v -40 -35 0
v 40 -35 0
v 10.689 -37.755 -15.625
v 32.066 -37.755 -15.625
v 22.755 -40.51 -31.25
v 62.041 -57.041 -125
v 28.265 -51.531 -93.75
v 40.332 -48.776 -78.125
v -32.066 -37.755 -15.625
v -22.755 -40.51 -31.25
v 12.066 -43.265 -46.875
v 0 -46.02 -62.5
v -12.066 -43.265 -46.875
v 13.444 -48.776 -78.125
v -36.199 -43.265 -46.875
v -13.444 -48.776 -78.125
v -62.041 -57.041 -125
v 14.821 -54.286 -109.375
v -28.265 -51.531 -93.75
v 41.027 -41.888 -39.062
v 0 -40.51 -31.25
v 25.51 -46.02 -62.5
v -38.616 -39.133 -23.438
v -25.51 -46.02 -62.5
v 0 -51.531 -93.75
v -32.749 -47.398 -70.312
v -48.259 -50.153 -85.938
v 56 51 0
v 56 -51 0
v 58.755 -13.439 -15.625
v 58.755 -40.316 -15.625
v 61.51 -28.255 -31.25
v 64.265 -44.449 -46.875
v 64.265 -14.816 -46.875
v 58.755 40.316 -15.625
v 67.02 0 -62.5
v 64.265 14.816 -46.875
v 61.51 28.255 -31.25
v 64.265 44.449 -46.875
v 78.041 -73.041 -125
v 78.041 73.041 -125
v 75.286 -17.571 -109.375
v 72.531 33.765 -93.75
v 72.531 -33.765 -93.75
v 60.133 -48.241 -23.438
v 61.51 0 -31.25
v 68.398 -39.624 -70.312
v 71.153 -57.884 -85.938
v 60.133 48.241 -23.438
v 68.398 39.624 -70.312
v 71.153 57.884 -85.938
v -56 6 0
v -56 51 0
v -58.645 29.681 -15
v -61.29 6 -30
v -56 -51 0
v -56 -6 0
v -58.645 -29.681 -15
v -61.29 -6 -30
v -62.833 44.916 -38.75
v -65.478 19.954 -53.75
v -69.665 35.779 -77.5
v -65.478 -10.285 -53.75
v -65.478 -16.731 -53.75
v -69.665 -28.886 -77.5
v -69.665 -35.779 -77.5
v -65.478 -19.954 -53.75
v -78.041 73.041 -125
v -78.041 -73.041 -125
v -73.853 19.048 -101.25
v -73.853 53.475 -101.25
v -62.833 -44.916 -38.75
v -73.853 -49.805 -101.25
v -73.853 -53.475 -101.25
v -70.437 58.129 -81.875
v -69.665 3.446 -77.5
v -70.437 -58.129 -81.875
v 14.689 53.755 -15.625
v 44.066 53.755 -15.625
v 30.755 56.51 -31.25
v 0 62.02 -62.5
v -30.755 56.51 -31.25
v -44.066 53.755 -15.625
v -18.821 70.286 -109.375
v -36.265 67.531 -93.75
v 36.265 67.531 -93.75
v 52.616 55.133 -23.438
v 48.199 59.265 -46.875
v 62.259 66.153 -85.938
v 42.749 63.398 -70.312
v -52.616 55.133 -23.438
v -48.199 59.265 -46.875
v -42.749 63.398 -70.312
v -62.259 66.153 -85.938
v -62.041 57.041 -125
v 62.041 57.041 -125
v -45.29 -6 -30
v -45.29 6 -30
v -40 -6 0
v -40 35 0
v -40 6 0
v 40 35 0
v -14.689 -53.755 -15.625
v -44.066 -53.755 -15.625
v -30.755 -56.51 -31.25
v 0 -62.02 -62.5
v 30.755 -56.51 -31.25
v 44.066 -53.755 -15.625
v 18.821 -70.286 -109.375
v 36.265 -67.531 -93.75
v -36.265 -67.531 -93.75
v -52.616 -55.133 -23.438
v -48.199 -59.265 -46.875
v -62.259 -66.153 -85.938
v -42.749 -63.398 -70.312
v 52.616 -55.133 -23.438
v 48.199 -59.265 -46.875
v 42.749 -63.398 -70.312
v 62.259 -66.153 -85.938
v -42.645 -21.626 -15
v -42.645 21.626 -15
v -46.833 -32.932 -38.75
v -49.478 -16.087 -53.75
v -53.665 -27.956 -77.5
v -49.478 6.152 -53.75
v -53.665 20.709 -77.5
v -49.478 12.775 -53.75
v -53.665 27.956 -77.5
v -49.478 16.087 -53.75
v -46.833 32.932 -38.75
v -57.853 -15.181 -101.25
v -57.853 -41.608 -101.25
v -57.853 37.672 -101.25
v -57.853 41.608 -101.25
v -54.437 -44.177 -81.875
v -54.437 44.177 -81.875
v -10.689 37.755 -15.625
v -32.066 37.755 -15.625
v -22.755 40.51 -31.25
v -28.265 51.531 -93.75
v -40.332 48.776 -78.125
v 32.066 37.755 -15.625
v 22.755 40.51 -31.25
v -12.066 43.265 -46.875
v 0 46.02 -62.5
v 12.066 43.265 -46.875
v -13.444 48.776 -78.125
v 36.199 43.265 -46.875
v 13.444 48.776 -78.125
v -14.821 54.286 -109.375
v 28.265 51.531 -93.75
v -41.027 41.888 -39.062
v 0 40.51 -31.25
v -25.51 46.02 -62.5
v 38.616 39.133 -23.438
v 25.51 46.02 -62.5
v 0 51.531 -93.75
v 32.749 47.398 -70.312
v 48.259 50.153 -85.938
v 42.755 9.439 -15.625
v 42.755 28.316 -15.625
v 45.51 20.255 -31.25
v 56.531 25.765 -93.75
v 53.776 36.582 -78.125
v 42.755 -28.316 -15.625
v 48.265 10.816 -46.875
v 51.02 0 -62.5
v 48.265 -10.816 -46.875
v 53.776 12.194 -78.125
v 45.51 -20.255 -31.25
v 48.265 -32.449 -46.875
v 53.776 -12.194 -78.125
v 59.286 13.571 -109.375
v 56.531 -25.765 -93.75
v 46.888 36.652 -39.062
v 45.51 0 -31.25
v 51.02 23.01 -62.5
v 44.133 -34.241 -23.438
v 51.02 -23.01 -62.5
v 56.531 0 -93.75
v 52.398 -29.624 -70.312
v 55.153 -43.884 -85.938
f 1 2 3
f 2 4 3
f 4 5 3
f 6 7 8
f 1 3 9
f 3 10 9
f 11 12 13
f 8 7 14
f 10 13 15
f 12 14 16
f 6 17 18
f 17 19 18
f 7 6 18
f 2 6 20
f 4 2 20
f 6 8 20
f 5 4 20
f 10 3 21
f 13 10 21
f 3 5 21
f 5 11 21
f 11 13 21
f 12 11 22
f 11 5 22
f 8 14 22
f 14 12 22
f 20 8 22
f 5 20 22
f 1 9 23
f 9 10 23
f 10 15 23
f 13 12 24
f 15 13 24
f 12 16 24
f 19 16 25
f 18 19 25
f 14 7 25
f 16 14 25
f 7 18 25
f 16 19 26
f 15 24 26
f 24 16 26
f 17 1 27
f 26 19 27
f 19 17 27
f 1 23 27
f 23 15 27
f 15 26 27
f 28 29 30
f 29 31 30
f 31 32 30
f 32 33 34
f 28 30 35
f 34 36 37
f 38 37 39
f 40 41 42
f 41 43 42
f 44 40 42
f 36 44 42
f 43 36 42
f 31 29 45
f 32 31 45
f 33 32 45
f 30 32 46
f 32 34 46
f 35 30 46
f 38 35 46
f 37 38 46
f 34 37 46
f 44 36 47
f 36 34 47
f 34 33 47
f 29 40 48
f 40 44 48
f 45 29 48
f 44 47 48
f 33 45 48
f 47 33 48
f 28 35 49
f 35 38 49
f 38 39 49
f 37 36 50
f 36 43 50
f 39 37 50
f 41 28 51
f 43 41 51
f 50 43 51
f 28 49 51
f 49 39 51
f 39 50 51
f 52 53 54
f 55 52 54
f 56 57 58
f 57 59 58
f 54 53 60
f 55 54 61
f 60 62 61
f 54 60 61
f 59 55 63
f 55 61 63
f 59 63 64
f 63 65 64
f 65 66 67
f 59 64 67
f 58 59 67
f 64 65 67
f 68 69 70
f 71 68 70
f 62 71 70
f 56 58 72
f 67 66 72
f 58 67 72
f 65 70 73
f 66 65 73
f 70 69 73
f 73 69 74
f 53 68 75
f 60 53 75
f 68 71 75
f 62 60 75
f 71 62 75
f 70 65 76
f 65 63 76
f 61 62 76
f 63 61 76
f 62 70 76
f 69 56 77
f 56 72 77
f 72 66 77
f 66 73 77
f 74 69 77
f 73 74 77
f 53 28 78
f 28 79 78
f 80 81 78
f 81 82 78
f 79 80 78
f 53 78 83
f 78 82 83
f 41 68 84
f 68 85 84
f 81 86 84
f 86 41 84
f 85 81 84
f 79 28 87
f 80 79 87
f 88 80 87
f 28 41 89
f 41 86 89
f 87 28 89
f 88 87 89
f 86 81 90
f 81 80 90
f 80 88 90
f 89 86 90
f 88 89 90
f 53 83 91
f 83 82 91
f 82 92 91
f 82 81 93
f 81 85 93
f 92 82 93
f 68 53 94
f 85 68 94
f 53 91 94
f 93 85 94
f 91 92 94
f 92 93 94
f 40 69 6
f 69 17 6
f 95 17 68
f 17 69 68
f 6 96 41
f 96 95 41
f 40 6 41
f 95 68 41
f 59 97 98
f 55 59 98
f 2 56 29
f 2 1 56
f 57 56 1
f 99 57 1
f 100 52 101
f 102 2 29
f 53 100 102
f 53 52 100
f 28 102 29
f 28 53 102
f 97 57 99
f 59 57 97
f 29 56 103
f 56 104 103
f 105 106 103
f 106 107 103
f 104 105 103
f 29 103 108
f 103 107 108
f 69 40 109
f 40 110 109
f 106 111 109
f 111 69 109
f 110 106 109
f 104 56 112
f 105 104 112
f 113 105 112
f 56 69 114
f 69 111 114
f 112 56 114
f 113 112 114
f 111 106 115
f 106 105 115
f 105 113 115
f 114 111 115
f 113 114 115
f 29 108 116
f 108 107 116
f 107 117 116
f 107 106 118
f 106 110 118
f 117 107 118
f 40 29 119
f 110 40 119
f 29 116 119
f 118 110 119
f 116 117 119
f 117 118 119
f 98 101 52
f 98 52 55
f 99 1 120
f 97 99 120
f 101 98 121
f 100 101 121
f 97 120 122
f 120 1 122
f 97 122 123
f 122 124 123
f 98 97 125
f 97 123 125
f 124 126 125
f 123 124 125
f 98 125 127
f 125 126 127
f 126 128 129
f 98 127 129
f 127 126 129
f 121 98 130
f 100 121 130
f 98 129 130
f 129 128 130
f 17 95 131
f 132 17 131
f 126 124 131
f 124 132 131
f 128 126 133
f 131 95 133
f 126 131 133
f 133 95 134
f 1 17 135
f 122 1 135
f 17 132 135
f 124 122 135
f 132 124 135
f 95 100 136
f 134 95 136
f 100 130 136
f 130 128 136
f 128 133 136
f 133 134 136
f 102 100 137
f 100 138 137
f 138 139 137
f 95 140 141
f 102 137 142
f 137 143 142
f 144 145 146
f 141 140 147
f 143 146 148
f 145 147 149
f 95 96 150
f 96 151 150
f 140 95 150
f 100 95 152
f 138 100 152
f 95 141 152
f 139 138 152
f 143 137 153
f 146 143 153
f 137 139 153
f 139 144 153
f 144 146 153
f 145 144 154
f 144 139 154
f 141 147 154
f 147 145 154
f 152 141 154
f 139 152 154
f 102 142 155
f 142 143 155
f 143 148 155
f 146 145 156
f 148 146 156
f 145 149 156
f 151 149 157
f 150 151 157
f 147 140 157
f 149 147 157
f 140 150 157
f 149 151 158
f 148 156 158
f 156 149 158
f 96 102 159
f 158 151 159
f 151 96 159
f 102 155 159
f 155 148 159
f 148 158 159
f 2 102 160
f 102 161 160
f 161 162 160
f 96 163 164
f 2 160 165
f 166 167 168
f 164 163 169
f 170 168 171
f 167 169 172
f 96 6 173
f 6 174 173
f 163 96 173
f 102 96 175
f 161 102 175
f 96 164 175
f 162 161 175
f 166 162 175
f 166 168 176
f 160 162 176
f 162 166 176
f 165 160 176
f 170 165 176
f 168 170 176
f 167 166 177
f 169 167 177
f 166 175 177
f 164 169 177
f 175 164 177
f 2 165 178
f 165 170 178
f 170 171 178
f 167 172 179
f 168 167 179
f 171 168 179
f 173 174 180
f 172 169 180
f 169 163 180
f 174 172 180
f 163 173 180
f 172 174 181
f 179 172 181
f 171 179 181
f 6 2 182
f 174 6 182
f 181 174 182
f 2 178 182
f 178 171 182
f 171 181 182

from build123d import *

# Parameters (mm, degrees)
SKETCH2_W                      = 112
SKETCH2_H                      = 102
BOSS_EXTRUDE1_DEPTH            = 125
BOSS_EXTRUDE1_TAPER            = -10
SKETCH3_W                      = 80
SKETCH3_H                      = 70
CUT_EXTRUDE1_DEPTH             = 125
CUT_EXTRUDE1_TAPER             = -10
CUT_EXTRUDE2_REACH             = 140.041
SKETCH5_W                      = 30
SKETCH5_H                      = 12
CUT_EXTRUDE2_DIRECTION_2_DEPTH = 10


with BuildPart() as part:
    # Sketch2 → Boss-Extrude1 (new body)
    with BuildSketch(Plane.XY):
        Rectangle(SKETCH2_W, SKETCH2_H)
    extrude(amount=-BOSS_EXTRUDE1_DEPTH, taper=BOSS_EXTRUDE1_TAPER)

    # Sketch3 → Cut-Extrude1 (cut)
    with BuildSketch(Plane(origin=(0, 0, 0), x_dir=(-1, 0, 0), z_dir=(0, 0, -1))):
        Rectangle(SKETCH3_W, SKETCH3_H)
    extrude(amount=CUT_EXTRUDE1_DEPTH, taper=CUT_EXTRUDE1_TAPER, mode=Mode.SUBTRACT)

    # Sketch5 → Cut-Extrude2 (cut, up to next)
    with BuildSketch(Plane(origin=(-60, 0, 0), x_dir=(0, 0, -1), z_dir=(1, 0, 0)), mode=Mode.PRIVATE) as cut_extrude2_sk1:
        with Locations((15, 0)):
            Rectangle(SKETCH5_W, SKETCH5_H)
    cut_extrude2_tool1 = extrude(cut_extrude2_sk1.sketch, amount=CUT_EXTRUDE2_REACH, mode=Mode.PRIVATE) & part.part
    add(cut_extrude2_tool1.solids().sort_by_distance((-60, 0, -15))[0], mode=Mode.SUBTRACT)

    # Sketch5 → Cut-Extrude2 direction 2 (cut)
    with BuildSketch(Plane(origin=(-60, 0, 0), x_dir=(0, 0, -1), z_dir=(1, 0, 0))):
        with Locations((15, 0)):
            Rectangle(SKETCH5_W, SKETCH5_H)
    extrude(amount=-CUT_EXTRUDE2_DIRECTION_2_DEPTH, mode=Mode.SUBTRACT)


solid = part.part
